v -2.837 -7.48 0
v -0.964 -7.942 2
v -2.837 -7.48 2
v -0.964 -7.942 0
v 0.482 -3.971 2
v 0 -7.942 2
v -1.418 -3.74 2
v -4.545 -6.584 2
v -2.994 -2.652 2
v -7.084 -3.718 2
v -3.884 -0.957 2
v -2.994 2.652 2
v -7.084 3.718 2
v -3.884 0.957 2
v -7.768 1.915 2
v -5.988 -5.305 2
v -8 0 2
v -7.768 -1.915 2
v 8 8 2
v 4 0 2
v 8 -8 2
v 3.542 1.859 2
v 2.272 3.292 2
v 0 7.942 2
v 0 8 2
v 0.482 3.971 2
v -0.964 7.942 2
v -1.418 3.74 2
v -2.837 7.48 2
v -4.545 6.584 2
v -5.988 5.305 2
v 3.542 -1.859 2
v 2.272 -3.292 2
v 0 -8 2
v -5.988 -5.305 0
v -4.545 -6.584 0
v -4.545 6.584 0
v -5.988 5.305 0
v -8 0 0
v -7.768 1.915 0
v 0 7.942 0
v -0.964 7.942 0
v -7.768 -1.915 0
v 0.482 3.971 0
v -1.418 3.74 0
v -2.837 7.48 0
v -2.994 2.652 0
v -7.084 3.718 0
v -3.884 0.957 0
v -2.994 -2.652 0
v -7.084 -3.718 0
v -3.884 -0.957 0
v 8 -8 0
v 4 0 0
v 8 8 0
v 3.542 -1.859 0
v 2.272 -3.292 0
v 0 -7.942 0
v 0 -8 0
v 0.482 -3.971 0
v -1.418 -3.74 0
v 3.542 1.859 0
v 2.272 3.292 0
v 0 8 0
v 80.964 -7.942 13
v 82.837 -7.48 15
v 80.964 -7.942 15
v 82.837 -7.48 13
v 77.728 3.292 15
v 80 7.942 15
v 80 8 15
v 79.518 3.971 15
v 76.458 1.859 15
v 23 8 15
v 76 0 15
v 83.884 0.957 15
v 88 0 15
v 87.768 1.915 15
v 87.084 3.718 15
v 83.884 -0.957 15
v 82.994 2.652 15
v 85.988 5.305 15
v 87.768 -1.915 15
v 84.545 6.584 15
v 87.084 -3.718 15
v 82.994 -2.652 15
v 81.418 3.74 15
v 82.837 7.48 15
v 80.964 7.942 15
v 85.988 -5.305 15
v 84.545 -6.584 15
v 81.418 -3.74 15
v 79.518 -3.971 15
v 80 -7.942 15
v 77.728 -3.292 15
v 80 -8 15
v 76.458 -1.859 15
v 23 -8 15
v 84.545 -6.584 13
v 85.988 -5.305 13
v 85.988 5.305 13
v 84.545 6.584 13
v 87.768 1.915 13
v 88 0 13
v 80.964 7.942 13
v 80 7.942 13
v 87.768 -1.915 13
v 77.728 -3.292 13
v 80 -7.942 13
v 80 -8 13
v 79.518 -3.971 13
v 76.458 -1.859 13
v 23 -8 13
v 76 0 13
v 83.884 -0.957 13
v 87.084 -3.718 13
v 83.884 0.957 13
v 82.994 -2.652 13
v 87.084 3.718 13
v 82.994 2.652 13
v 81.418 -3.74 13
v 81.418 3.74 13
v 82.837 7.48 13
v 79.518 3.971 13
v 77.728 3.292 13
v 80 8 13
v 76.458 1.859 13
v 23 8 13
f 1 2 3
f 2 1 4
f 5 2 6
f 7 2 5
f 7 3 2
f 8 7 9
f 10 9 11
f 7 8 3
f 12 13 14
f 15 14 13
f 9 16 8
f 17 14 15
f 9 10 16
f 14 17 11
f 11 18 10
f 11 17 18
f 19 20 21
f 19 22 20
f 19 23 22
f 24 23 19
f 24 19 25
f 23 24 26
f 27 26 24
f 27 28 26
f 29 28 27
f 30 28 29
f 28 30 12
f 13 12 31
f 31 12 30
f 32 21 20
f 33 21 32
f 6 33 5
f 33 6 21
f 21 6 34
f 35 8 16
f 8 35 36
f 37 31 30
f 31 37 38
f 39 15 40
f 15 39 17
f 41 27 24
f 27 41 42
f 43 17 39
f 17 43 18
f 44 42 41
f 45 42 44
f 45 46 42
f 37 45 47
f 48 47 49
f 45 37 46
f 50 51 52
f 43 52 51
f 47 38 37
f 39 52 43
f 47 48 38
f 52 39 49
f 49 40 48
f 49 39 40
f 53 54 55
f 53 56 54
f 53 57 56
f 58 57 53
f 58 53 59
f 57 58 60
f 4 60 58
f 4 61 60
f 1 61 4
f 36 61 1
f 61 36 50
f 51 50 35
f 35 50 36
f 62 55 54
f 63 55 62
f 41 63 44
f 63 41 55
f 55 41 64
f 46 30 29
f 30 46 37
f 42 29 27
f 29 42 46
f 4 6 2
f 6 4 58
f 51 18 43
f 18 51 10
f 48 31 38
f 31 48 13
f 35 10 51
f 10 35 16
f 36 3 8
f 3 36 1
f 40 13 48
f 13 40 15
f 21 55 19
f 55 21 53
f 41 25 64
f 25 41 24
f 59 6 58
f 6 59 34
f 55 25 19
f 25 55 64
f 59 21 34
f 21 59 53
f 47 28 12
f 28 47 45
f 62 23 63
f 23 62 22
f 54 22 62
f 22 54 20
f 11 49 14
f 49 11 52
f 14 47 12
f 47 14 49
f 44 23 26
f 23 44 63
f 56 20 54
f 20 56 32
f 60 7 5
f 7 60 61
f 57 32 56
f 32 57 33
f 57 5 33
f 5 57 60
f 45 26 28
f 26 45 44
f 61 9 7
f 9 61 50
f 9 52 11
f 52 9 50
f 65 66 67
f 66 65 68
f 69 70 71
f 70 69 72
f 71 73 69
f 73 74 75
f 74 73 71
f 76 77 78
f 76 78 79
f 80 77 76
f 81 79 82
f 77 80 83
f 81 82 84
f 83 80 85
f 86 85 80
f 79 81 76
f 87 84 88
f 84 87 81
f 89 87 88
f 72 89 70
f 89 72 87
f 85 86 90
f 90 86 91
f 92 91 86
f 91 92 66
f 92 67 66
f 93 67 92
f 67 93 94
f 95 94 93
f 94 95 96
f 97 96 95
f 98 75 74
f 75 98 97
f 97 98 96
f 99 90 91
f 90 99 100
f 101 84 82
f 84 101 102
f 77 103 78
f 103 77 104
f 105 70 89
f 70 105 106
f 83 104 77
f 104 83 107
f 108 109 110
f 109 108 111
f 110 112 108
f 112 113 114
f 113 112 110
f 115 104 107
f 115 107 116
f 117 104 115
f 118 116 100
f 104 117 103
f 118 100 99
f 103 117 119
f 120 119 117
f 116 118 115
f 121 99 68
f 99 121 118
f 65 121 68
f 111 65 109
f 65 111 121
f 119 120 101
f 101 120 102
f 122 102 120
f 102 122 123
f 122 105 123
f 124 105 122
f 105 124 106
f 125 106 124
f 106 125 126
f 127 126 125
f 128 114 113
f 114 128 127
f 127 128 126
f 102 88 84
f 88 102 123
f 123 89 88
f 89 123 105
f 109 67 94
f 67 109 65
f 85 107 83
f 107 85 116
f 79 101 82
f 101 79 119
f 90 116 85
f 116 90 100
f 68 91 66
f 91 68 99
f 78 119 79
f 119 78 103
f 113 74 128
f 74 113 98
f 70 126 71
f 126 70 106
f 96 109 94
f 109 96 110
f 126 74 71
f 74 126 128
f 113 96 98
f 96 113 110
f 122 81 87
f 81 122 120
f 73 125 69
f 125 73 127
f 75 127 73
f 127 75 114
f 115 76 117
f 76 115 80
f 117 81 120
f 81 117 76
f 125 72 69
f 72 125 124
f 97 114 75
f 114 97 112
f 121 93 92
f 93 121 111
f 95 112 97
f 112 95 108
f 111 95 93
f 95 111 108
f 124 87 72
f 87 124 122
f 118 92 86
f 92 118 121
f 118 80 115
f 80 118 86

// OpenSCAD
module arbor_end(d=8, w=16, t=2, l=8){
    /*
    Disk with a hole of 
    diameter d=8, 
    thickness t=2, 
    outer diameter=w
    l = length of bar
    center of hole at origin
    */
      difference(){
        union(){
          cylinder(t,d=w);
          translate([0,-w/2,0]){cube([l,w,t]);}
        }
        cylinder(t,d=d);
      }
     

}


module bent_linkage(t=2, d=8, h=15, l=80, dx=1){
  /*
  * t = thickness
  * d = hole diameter
  * w = 2*d = width
  * h = height
  * l = length between hole centers
  * dx = overlap angled bar for extra thickness
  */
    w = 2*d;
  
    union(){ 
      arbor_end(d,w,t);
    
      // angle bar, polyhedron approach
      polyhedron(
        points=[
          [d,-w/2,0], // 0
          [d,w/2,0],  // 1
          [d-dx,w/2,t], // 2
          [d-dx,-w/2,t],  //3 // skew by -1 to add thinkness
          [d+h+dx,-w/2,h-t],
          [d+h+dx,w/2,h-t],
          [d+h,w/2,h],
          [d+h,-w/2,h]],
        faces=[
          [0,1,2,3],
          [4,5,6,7],
          [0,3,7,4],
          [1,2,6,5],
          [3,2,6,7],
          [0,1,5,4]]);
          
       // angled bar is 45 degree, heigth = h, base = h, starting at d
       // length of top bar from angled bit to cender of arbor
       top_len = l-(d+h);
       translate([l,0,h-t]){
            mirror(0,1,0){arbor_end(d,w,t,top_len);}
       }
       
   }
      
}
  

bent_linkage();
 
